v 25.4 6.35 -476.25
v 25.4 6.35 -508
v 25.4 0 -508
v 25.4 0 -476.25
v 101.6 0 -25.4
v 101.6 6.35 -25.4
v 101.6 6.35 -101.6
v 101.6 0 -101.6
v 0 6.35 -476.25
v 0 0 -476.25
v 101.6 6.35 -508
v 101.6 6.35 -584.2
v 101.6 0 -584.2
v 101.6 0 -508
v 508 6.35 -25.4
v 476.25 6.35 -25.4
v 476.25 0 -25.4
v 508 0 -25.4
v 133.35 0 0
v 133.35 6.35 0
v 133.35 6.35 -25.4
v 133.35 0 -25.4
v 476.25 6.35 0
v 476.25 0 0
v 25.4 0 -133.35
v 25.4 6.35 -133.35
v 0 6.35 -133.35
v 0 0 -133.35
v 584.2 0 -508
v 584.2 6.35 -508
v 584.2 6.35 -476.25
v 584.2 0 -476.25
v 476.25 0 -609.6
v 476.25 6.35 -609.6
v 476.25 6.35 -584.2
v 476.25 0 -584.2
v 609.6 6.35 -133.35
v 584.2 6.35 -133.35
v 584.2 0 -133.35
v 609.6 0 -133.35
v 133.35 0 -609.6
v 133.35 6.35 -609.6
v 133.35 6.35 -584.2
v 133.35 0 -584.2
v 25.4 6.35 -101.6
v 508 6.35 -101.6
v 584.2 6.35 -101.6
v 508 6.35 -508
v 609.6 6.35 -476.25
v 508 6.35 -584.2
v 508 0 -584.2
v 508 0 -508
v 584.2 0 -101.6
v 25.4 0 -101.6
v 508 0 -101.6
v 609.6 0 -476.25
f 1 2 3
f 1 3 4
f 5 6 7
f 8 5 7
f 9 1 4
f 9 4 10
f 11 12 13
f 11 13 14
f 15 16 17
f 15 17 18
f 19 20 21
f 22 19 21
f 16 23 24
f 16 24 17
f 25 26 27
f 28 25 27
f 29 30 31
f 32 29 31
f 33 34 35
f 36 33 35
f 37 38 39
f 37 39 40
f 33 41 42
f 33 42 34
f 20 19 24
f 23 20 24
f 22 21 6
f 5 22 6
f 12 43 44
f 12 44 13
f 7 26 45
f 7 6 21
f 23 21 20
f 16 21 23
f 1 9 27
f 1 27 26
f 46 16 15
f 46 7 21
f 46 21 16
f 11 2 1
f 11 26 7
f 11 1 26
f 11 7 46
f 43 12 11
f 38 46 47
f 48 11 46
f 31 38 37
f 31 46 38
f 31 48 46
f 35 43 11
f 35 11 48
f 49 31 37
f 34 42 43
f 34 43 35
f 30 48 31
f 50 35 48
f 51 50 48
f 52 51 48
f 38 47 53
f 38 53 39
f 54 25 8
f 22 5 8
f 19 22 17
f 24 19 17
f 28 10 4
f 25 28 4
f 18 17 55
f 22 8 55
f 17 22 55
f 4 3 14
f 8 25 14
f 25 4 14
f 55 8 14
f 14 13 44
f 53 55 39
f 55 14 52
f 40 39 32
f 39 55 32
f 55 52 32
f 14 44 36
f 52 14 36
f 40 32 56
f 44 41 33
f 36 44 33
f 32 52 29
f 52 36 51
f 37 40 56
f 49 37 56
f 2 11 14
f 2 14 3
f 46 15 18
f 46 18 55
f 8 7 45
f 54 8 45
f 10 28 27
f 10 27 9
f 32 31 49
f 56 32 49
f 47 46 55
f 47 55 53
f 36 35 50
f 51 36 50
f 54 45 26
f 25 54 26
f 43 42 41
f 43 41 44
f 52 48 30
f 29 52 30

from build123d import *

# Parameters (mm, degrees)
SKETCH1_W           = 609.6
SKETCH1_H           = 609.6
BOSS_EXTRUDE1_DEPTH = 6.35
CUT_EXTRUDE1_DEPTH  = 863.127973389


with BuildPart() as part:
    # Sketch1 → Boss-Extrude1 (new body)
    with BuildSketch(Plane(origin=(0, 0, 0), x_dir=(1, 0, 0), z_dir=(0, 1, 0))):
        with Locations((304.8, 304.8)):
            Rectangle(SKETCH1_W, SKETCH1_H)
    extrude(amount=BOSS_EXTRUDE1_DEPTH)

    # Sketch2 → Cut-Extrude1 (cut, through all)
    with BuildSketch(Plane(origin=(0, 6.35, 0), x_dir=(1, 0, 0), z_dir=(0, 1, 0))):
        Polygon((609.6, 0), (476.25, 0), (476.25, 25.4), (508, 25.4), (508, 101.6), (584.2, 101.6), (584.2, 133.35), (609.6, 133.35), align=None)
        Polygon((0, 133.35), (0, 0), (133.35, 0), (133.35, 25.4), (101.6, 25.4), (101.6, 101.6), (25.4, 101.6), (25.4, 133.35), align=None)
        Polygon((0, 609.6), (133.35, 609.6), (133.35, 584.2), (101.6, 584.2), (101.6, 508), (25.4, 508), (25.4, 476.25), (0, 476.25), align=None)
        Polygon((609.6, 476.25), (609.6, 609.6), (476.25, 609.6), (476.25, 584.2), (508, 584.2), (508, 508), (584.2, 508), (584.2, 476.25), align=None)
    extrude(amount=-CUT_EXTRUDE1_DEPTH, mode=Mode.SUBTRACT)


solid = part.part
